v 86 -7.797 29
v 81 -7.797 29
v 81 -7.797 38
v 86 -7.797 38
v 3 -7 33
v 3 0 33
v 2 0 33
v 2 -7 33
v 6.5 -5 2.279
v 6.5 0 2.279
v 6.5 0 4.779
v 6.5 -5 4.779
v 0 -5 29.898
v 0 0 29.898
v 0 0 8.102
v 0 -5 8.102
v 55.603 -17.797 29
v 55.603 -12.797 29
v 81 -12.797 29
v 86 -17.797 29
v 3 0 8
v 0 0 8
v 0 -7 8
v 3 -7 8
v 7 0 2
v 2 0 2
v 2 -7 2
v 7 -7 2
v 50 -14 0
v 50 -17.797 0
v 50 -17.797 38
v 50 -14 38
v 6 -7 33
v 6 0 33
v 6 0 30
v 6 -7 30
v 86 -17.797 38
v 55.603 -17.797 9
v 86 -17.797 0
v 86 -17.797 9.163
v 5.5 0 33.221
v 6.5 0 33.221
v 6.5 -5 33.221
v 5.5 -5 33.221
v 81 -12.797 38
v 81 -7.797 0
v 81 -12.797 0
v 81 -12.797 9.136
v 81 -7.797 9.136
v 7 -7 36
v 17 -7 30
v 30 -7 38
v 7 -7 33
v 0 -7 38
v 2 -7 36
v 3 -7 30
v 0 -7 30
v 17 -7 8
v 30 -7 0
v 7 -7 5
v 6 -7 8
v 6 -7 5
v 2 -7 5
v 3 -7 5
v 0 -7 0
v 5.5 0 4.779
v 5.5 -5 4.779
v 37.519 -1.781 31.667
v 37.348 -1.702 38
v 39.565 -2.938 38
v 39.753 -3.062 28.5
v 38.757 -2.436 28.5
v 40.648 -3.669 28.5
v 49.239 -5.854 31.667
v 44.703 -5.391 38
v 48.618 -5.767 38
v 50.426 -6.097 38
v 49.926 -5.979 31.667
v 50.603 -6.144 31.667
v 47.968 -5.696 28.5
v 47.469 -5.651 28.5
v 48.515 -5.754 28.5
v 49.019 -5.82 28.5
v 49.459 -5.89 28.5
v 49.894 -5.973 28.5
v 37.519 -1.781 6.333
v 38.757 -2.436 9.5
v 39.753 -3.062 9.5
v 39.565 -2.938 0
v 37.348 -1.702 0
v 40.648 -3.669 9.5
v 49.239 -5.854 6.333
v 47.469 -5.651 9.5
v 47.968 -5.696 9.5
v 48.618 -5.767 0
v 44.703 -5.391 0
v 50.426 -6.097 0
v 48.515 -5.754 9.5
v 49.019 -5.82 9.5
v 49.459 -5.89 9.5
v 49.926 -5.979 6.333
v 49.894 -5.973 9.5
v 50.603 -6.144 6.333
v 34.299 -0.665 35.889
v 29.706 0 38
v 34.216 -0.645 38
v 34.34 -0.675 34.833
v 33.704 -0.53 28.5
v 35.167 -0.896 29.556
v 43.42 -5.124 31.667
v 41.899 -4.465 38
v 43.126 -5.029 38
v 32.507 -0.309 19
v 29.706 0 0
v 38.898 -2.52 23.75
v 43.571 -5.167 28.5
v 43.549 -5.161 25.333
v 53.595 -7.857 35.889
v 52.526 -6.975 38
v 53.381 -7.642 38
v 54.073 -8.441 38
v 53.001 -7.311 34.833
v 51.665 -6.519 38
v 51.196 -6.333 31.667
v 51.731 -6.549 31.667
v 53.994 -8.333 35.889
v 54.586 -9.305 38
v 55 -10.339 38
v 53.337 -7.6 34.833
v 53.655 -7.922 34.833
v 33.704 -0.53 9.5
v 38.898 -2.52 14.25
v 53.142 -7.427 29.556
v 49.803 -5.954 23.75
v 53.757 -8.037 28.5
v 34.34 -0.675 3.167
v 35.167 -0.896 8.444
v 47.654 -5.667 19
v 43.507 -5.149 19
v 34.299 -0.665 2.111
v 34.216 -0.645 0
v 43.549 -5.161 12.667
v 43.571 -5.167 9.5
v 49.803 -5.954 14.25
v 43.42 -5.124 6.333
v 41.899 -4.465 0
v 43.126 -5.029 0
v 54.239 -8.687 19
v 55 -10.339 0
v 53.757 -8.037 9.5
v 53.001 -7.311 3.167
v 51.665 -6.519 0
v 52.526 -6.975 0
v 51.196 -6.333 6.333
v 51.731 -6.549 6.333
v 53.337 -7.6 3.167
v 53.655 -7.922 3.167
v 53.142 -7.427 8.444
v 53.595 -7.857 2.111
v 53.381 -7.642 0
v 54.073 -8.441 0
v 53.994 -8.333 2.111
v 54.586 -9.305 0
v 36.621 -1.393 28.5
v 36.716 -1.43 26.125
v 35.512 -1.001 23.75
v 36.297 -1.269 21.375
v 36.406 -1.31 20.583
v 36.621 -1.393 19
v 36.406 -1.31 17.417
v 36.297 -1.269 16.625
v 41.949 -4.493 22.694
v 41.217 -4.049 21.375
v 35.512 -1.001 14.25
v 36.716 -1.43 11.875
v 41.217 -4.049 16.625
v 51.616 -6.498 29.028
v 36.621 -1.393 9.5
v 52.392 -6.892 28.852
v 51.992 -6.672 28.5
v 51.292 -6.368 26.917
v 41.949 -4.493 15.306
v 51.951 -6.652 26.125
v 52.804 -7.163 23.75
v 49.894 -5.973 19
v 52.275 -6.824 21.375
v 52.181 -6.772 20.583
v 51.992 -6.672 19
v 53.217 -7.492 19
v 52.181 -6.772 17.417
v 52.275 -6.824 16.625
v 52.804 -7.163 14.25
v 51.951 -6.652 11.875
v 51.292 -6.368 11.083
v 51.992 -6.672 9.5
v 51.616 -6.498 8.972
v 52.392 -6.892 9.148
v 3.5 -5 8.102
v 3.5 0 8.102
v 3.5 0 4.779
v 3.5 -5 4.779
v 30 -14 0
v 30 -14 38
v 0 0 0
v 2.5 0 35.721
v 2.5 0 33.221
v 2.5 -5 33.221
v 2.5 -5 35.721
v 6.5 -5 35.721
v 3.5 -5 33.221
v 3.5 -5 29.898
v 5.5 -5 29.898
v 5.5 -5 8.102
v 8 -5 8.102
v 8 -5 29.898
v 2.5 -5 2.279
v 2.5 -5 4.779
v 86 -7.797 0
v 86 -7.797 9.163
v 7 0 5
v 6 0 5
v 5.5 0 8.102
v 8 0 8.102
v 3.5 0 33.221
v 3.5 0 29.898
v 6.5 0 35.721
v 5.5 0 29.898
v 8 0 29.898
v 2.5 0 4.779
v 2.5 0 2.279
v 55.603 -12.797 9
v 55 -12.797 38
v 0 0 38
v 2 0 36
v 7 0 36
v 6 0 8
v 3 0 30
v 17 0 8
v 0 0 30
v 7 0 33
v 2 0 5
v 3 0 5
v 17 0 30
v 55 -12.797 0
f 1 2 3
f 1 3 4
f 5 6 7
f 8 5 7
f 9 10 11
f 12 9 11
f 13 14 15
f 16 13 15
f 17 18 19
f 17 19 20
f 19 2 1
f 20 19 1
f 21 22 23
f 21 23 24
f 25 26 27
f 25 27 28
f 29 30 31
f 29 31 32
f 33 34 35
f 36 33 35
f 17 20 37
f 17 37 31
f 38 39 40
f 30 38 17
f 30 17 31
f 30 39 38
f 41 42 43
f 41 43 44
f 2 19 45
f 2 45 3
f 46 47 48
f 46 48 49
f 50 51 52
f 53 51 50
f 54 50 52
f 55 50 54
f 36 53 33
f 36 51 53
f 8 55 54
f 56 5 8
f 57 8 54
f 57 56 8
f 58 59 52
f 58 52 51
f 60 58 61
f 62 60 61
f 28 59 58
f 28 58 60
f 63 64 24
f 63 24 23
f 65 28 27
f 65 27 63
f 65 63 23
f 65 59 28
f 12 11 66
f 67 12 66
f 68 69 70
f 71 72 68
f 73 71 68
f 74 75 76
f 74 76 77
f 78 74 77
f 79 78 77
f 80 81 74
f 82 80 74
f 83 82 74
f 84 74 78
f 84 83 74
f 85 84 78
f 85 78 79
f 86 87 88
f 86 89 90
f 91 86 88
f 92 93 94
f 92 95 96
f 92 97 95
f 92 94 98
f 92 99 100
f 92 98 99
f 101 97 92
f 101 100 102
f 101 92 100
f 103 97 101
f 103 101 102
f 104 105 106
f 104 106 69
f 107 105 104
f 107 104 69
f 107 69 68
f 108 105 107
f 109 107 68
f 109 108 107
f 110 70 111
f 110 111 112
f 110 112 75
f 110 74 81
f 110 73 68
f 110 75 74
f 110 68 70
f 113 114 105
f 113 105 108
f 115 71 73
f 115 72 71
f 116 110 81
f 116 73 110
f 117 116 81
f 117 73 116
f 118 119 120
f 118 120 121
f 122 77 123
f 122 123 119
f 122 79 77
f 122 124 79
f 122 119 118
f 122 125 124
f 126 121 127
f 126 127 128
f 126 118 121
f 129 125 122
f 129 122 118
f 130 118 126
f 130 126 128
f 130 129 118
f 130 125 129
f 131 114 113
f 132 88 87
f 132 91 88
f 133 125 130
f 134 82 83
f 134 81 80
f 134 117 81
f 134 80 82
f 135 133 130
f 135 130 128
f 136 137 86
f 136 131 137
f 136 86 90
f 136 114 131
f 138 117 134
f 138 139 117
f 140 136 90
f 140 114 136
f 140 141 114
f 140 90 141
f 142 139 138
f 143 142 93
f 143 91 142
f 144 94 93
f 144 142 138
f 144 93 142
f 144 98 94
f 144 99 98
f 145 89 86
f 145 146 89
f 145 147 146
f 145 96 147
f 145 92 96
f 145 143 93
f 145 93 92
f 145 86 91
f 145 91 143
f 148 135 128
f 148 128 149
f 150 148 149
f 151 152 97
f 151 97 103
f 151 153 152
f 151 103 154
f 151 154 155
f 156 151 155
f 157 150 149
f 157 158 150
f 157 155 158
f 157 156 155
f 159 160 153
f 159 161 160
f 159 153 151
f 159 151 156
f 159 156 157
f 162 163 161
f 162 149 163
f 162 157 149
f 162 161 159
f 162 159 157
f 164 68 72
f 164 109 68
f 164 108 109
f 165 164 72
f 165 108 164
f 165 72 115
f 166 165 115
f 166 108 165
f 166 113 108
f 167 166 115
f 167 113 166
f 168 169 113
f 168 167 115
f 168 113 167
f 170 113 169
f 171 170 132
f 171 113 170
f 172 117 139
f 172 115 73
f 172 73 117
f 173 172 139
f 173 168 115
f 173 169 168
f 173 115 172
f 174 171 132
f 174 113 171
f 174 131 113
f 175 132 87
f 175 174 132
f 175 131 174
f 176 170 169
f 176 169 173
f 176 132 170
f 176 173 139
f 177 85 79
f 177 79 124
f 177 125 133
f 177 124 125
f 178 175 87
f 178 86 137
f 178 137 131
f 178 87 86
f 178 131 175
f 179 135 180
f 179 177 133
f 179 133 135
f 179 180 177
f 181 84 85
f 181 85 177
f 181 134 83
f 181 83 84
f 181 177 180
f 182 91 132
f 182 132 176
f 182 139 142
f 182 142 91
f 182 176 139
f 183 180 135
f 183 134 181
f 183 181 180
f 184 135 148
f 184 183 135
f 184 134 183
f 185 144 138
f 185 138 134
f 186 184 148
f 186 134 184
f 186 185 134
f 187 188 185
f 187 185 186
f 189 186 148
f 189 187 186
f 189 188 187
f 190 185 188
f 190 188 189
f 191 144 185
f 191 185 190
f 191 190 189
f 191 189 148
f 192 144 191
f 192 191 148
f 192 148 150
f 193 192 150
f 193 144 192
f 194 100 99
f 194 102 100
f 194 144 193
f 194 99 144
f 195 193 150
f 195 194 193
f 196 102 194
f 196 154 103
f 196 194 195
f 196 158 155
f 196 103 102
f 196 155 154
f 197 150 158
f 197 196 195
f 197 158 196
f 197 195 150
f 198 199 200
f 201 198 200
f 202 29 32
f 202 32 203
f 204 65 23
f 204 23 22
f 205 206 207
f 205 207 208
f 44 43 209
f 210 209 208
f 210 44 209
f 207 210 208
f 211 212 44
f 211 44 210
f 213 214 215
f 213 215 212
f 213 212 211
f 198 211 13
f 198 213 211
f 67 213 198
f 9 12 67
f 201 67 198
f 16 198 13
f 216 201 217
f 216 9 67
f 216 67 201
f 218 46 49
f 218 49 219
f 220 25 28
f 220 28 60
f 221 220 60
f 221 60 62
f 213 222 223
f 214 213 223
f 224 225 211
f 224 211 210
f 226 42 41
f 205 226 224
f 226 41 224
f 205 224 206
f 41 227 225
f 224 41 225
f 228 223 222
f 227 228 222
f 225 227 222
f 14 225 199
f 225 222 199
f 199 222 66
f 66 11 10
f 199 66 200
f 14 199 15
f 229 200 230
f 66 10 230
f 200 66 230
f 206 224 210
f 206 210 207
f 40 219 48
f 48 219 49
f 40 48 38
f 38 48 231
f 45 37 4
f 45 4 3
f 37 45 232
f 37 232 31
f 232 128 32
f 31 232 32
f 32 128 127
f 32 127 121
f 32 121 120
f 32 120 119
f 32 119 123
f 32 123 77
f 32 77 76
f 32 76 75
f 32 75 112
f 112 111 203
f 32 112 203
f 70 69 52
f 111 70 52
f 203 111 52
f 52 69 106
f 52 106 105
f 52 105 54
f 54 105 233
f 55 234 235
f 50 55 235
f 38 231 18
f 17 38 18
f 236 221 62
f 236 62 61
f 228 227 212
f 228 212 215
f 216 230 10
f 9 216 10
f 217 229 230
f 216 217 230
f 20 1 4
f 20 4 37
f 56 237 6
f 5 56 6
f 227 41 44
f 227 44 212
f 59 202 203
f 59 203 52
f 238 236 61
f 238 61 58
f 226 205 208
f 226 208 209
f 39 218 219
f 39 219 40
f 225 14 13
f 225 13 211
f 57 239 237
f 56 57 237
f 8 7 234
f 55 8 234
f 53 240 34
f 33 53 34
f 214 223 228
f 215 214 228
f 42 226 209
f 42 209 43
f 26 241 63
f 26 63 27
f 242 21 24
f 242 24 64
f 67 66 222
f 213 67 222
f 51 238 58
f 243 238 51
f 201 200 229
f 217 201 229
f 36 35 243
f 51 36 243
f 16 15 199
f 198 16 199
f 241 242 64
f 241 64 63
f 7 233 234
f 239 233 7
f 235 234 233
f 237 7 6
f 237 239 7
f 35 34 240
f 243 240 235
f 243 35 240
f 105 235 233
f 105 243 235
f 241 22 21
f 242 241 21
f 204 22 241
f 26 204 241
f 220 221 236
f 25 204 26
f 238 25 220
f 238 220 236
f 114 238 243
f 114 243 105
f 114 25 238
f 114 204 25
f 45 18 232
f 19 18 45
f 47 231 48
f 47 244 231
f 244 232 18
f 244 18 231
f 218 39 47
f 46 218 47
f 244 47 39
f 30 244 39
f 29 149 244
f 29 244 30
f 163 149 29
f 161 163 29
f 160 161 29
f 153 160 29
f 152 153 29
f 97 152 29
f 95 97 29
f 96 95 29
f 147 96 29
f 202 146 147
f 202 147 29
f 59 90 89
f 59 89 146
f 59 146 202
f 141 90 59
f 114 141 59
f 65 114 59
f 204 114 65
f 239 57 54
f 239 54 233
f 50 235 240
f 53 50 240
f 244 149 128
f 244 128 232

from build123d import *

# Parameters (mm, degrees)
PAD_DEPTH            = 38
POCKET_DEPTH         = 209.180233
POCKET001_DEPTH      = 0.001
POCKET001_DEPTH_BACK = -17.79843
PAD001_DEPTH         = 5


with BuildPart() as body:
    # Sketch → Pad (new body)
    with BuildSketch(Plane.XY):
        with BuildLine():
            Line((30, -7), (0, -7))
            Line((0, -7), (0, 0))
            Line((0, 0), (29.705568, 0))
            add(Edge.make_bspline(
                [(29.705568, 0), (38.986351, -0.628442), (40.938854, -7.674414), (53.163189, -4.61833), (55, -10.338793)],
                knots=[0, 0, 0, 0, 0.5, 1, 1, 1, 1], degree=3))
            Line((55, -10.338793), (55, -12.79743))
            Line((55, -12.79743), (81, -12.79743))
            Line((81, -12.79743), (81, -7.79743))
            Line((81, -7.79743), (86, -7.79743))
            Line((86, -7.79743), (86, -17.79743))
            Line((86, -17.79743), (50, -17.79743))
            Line((50, -17.79743), (50, -14))
            Line((50, -14), (30, -14))
            Line((30, -14), (30, -7))
        make_face()
    extrude(amount=PAD_DEPTH)

    # Sketch001 (on DatumPlane) → Pocket (cut, through all)
    with BuildSketch(Plane(origin=(0, 0, 30), x_dir=(0, 0, 1), z_dir=(0, 1, 0))):
        Polygon((0, 17), (-11, 17), (-11, 0), (0, 0), (0, 3), (3, 3), (3, 2), (6, 2), (6, 7), (3, 7), (3, 6), (0, 6), (0, 8), align=None)
    pocket = extrude(amount=-POCKET_DEPTH, mode=Mode.SUBTRACT)

    # Mirrored: Pocket across Sketch001 Axis3
    add(pocket.mirror(Plane(origin=(41.528492, 0, 19), x_dir=(0, 1, 0), z_dir=(0, 0, 1))), mode=Mode.SUBTRACT)

    # Sketch003 → Pocket001 (cut, two sides)
    with BuildSketch(Plane(origin=(-10, 0, 0), x_dir=(1, 0, 0), z_dir=(0, -1, 0))) as pocket001_sk:
        Polygon((65.602734, 29), (97.224255, 29), (97.224255, 9.169783), (65.602734, 9), align=None)
    extrude(amount=-POCKET001_DEPTH, mode=Mode.SUBTRACT)
    extrude(pocket001_sk.sketch, amount=-POCKET001_DEPTH_BACK, mode=Mode.SUBTRACT)


with BuildPart() as fermeture:
    # Sketch004 → Pad001 (new body)
    with BuildSketch(Plane.XZ):
        Polygon((0, 29.897505), (3.5, 29.897505), (3.5, 33.221244), (2.5, 33.221244), (2.5, 35.721244), (6.5, 35.721244), (6.5, 33.221244), (5.5, 33.221244), (5.5, 29.897505), (8, 29.897505), (8, 19), (0, 19), align=None)
    pad001 = extrude(amount=PAD001_DEPTH)

    # Mirrored001: Pad001 across Sketch004 Axis2
    add(pad001.mirror(Plane(origin=(-14.053349, 0, 19), x_dir=(0, -1, 0), z_dir=(0, 0, 1))))


solid = Compound([body.part, fermeture.part])
